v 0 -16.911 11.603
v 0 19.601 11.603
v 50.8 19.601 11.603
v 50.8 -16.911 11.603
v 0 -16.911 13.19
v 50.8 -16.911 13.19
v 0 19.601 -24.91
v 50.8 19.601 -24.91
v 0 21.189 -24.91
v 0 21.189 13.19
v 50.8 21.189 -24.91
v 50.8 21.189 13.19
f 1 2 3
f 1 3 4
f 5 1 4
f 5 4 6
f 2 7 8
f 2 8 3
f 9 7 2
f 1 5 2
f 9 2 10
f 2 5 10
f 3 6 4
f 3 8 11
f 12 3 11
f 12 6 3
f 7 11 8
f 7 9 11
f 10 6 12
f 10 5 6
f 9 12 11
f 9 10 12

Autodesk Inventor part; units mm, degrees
ref_plane "YZ Plane" through (0, 0, 0) normal (1, 0, 0) x (0, 1, 0)
ref_plane "XZ Plane" through (0, 0, 0) normal (0, 1, 0) x (-1, 0, 0)
ref_plane "XY Plane" through (0, 0, 0) normal (0, 0, 1) x (1, 0, 0)
sketch "Sketch1" plane through (0, 0, 0) normal (1, 0, 0) x (0, 1, 0)
  line L0 (-16.9111, 13.1902) -> (21.1889, 13.1902)
  line L1 (21.1889, 13.1902) -> (21.1889, -24.9098)
  line L2 (21.1889, -24.9098) -> (19.6014, -24.9098)
  line L3 (19.6014, -24.9098) -> (19.6014, 11.6027)
  line L4 (19.6014, 11.6027) -> (-16.9111, 11.6027)
  line L5 (-16.9111, 11.6027) -> (-16.9111, 13.1902)
  point P0 (0, 0)
  dimension "d0" = 38.1
  dimension "d1" = 38.1
  dimension "d2" = 1.5875
  dimension "d3" = 36.5125
  dimension "d4" = 36.5125
extrude "Extrusion1" add sketch "Sketch1" along normal blind 50.8
properties part number "corner piece 2x1.5"
